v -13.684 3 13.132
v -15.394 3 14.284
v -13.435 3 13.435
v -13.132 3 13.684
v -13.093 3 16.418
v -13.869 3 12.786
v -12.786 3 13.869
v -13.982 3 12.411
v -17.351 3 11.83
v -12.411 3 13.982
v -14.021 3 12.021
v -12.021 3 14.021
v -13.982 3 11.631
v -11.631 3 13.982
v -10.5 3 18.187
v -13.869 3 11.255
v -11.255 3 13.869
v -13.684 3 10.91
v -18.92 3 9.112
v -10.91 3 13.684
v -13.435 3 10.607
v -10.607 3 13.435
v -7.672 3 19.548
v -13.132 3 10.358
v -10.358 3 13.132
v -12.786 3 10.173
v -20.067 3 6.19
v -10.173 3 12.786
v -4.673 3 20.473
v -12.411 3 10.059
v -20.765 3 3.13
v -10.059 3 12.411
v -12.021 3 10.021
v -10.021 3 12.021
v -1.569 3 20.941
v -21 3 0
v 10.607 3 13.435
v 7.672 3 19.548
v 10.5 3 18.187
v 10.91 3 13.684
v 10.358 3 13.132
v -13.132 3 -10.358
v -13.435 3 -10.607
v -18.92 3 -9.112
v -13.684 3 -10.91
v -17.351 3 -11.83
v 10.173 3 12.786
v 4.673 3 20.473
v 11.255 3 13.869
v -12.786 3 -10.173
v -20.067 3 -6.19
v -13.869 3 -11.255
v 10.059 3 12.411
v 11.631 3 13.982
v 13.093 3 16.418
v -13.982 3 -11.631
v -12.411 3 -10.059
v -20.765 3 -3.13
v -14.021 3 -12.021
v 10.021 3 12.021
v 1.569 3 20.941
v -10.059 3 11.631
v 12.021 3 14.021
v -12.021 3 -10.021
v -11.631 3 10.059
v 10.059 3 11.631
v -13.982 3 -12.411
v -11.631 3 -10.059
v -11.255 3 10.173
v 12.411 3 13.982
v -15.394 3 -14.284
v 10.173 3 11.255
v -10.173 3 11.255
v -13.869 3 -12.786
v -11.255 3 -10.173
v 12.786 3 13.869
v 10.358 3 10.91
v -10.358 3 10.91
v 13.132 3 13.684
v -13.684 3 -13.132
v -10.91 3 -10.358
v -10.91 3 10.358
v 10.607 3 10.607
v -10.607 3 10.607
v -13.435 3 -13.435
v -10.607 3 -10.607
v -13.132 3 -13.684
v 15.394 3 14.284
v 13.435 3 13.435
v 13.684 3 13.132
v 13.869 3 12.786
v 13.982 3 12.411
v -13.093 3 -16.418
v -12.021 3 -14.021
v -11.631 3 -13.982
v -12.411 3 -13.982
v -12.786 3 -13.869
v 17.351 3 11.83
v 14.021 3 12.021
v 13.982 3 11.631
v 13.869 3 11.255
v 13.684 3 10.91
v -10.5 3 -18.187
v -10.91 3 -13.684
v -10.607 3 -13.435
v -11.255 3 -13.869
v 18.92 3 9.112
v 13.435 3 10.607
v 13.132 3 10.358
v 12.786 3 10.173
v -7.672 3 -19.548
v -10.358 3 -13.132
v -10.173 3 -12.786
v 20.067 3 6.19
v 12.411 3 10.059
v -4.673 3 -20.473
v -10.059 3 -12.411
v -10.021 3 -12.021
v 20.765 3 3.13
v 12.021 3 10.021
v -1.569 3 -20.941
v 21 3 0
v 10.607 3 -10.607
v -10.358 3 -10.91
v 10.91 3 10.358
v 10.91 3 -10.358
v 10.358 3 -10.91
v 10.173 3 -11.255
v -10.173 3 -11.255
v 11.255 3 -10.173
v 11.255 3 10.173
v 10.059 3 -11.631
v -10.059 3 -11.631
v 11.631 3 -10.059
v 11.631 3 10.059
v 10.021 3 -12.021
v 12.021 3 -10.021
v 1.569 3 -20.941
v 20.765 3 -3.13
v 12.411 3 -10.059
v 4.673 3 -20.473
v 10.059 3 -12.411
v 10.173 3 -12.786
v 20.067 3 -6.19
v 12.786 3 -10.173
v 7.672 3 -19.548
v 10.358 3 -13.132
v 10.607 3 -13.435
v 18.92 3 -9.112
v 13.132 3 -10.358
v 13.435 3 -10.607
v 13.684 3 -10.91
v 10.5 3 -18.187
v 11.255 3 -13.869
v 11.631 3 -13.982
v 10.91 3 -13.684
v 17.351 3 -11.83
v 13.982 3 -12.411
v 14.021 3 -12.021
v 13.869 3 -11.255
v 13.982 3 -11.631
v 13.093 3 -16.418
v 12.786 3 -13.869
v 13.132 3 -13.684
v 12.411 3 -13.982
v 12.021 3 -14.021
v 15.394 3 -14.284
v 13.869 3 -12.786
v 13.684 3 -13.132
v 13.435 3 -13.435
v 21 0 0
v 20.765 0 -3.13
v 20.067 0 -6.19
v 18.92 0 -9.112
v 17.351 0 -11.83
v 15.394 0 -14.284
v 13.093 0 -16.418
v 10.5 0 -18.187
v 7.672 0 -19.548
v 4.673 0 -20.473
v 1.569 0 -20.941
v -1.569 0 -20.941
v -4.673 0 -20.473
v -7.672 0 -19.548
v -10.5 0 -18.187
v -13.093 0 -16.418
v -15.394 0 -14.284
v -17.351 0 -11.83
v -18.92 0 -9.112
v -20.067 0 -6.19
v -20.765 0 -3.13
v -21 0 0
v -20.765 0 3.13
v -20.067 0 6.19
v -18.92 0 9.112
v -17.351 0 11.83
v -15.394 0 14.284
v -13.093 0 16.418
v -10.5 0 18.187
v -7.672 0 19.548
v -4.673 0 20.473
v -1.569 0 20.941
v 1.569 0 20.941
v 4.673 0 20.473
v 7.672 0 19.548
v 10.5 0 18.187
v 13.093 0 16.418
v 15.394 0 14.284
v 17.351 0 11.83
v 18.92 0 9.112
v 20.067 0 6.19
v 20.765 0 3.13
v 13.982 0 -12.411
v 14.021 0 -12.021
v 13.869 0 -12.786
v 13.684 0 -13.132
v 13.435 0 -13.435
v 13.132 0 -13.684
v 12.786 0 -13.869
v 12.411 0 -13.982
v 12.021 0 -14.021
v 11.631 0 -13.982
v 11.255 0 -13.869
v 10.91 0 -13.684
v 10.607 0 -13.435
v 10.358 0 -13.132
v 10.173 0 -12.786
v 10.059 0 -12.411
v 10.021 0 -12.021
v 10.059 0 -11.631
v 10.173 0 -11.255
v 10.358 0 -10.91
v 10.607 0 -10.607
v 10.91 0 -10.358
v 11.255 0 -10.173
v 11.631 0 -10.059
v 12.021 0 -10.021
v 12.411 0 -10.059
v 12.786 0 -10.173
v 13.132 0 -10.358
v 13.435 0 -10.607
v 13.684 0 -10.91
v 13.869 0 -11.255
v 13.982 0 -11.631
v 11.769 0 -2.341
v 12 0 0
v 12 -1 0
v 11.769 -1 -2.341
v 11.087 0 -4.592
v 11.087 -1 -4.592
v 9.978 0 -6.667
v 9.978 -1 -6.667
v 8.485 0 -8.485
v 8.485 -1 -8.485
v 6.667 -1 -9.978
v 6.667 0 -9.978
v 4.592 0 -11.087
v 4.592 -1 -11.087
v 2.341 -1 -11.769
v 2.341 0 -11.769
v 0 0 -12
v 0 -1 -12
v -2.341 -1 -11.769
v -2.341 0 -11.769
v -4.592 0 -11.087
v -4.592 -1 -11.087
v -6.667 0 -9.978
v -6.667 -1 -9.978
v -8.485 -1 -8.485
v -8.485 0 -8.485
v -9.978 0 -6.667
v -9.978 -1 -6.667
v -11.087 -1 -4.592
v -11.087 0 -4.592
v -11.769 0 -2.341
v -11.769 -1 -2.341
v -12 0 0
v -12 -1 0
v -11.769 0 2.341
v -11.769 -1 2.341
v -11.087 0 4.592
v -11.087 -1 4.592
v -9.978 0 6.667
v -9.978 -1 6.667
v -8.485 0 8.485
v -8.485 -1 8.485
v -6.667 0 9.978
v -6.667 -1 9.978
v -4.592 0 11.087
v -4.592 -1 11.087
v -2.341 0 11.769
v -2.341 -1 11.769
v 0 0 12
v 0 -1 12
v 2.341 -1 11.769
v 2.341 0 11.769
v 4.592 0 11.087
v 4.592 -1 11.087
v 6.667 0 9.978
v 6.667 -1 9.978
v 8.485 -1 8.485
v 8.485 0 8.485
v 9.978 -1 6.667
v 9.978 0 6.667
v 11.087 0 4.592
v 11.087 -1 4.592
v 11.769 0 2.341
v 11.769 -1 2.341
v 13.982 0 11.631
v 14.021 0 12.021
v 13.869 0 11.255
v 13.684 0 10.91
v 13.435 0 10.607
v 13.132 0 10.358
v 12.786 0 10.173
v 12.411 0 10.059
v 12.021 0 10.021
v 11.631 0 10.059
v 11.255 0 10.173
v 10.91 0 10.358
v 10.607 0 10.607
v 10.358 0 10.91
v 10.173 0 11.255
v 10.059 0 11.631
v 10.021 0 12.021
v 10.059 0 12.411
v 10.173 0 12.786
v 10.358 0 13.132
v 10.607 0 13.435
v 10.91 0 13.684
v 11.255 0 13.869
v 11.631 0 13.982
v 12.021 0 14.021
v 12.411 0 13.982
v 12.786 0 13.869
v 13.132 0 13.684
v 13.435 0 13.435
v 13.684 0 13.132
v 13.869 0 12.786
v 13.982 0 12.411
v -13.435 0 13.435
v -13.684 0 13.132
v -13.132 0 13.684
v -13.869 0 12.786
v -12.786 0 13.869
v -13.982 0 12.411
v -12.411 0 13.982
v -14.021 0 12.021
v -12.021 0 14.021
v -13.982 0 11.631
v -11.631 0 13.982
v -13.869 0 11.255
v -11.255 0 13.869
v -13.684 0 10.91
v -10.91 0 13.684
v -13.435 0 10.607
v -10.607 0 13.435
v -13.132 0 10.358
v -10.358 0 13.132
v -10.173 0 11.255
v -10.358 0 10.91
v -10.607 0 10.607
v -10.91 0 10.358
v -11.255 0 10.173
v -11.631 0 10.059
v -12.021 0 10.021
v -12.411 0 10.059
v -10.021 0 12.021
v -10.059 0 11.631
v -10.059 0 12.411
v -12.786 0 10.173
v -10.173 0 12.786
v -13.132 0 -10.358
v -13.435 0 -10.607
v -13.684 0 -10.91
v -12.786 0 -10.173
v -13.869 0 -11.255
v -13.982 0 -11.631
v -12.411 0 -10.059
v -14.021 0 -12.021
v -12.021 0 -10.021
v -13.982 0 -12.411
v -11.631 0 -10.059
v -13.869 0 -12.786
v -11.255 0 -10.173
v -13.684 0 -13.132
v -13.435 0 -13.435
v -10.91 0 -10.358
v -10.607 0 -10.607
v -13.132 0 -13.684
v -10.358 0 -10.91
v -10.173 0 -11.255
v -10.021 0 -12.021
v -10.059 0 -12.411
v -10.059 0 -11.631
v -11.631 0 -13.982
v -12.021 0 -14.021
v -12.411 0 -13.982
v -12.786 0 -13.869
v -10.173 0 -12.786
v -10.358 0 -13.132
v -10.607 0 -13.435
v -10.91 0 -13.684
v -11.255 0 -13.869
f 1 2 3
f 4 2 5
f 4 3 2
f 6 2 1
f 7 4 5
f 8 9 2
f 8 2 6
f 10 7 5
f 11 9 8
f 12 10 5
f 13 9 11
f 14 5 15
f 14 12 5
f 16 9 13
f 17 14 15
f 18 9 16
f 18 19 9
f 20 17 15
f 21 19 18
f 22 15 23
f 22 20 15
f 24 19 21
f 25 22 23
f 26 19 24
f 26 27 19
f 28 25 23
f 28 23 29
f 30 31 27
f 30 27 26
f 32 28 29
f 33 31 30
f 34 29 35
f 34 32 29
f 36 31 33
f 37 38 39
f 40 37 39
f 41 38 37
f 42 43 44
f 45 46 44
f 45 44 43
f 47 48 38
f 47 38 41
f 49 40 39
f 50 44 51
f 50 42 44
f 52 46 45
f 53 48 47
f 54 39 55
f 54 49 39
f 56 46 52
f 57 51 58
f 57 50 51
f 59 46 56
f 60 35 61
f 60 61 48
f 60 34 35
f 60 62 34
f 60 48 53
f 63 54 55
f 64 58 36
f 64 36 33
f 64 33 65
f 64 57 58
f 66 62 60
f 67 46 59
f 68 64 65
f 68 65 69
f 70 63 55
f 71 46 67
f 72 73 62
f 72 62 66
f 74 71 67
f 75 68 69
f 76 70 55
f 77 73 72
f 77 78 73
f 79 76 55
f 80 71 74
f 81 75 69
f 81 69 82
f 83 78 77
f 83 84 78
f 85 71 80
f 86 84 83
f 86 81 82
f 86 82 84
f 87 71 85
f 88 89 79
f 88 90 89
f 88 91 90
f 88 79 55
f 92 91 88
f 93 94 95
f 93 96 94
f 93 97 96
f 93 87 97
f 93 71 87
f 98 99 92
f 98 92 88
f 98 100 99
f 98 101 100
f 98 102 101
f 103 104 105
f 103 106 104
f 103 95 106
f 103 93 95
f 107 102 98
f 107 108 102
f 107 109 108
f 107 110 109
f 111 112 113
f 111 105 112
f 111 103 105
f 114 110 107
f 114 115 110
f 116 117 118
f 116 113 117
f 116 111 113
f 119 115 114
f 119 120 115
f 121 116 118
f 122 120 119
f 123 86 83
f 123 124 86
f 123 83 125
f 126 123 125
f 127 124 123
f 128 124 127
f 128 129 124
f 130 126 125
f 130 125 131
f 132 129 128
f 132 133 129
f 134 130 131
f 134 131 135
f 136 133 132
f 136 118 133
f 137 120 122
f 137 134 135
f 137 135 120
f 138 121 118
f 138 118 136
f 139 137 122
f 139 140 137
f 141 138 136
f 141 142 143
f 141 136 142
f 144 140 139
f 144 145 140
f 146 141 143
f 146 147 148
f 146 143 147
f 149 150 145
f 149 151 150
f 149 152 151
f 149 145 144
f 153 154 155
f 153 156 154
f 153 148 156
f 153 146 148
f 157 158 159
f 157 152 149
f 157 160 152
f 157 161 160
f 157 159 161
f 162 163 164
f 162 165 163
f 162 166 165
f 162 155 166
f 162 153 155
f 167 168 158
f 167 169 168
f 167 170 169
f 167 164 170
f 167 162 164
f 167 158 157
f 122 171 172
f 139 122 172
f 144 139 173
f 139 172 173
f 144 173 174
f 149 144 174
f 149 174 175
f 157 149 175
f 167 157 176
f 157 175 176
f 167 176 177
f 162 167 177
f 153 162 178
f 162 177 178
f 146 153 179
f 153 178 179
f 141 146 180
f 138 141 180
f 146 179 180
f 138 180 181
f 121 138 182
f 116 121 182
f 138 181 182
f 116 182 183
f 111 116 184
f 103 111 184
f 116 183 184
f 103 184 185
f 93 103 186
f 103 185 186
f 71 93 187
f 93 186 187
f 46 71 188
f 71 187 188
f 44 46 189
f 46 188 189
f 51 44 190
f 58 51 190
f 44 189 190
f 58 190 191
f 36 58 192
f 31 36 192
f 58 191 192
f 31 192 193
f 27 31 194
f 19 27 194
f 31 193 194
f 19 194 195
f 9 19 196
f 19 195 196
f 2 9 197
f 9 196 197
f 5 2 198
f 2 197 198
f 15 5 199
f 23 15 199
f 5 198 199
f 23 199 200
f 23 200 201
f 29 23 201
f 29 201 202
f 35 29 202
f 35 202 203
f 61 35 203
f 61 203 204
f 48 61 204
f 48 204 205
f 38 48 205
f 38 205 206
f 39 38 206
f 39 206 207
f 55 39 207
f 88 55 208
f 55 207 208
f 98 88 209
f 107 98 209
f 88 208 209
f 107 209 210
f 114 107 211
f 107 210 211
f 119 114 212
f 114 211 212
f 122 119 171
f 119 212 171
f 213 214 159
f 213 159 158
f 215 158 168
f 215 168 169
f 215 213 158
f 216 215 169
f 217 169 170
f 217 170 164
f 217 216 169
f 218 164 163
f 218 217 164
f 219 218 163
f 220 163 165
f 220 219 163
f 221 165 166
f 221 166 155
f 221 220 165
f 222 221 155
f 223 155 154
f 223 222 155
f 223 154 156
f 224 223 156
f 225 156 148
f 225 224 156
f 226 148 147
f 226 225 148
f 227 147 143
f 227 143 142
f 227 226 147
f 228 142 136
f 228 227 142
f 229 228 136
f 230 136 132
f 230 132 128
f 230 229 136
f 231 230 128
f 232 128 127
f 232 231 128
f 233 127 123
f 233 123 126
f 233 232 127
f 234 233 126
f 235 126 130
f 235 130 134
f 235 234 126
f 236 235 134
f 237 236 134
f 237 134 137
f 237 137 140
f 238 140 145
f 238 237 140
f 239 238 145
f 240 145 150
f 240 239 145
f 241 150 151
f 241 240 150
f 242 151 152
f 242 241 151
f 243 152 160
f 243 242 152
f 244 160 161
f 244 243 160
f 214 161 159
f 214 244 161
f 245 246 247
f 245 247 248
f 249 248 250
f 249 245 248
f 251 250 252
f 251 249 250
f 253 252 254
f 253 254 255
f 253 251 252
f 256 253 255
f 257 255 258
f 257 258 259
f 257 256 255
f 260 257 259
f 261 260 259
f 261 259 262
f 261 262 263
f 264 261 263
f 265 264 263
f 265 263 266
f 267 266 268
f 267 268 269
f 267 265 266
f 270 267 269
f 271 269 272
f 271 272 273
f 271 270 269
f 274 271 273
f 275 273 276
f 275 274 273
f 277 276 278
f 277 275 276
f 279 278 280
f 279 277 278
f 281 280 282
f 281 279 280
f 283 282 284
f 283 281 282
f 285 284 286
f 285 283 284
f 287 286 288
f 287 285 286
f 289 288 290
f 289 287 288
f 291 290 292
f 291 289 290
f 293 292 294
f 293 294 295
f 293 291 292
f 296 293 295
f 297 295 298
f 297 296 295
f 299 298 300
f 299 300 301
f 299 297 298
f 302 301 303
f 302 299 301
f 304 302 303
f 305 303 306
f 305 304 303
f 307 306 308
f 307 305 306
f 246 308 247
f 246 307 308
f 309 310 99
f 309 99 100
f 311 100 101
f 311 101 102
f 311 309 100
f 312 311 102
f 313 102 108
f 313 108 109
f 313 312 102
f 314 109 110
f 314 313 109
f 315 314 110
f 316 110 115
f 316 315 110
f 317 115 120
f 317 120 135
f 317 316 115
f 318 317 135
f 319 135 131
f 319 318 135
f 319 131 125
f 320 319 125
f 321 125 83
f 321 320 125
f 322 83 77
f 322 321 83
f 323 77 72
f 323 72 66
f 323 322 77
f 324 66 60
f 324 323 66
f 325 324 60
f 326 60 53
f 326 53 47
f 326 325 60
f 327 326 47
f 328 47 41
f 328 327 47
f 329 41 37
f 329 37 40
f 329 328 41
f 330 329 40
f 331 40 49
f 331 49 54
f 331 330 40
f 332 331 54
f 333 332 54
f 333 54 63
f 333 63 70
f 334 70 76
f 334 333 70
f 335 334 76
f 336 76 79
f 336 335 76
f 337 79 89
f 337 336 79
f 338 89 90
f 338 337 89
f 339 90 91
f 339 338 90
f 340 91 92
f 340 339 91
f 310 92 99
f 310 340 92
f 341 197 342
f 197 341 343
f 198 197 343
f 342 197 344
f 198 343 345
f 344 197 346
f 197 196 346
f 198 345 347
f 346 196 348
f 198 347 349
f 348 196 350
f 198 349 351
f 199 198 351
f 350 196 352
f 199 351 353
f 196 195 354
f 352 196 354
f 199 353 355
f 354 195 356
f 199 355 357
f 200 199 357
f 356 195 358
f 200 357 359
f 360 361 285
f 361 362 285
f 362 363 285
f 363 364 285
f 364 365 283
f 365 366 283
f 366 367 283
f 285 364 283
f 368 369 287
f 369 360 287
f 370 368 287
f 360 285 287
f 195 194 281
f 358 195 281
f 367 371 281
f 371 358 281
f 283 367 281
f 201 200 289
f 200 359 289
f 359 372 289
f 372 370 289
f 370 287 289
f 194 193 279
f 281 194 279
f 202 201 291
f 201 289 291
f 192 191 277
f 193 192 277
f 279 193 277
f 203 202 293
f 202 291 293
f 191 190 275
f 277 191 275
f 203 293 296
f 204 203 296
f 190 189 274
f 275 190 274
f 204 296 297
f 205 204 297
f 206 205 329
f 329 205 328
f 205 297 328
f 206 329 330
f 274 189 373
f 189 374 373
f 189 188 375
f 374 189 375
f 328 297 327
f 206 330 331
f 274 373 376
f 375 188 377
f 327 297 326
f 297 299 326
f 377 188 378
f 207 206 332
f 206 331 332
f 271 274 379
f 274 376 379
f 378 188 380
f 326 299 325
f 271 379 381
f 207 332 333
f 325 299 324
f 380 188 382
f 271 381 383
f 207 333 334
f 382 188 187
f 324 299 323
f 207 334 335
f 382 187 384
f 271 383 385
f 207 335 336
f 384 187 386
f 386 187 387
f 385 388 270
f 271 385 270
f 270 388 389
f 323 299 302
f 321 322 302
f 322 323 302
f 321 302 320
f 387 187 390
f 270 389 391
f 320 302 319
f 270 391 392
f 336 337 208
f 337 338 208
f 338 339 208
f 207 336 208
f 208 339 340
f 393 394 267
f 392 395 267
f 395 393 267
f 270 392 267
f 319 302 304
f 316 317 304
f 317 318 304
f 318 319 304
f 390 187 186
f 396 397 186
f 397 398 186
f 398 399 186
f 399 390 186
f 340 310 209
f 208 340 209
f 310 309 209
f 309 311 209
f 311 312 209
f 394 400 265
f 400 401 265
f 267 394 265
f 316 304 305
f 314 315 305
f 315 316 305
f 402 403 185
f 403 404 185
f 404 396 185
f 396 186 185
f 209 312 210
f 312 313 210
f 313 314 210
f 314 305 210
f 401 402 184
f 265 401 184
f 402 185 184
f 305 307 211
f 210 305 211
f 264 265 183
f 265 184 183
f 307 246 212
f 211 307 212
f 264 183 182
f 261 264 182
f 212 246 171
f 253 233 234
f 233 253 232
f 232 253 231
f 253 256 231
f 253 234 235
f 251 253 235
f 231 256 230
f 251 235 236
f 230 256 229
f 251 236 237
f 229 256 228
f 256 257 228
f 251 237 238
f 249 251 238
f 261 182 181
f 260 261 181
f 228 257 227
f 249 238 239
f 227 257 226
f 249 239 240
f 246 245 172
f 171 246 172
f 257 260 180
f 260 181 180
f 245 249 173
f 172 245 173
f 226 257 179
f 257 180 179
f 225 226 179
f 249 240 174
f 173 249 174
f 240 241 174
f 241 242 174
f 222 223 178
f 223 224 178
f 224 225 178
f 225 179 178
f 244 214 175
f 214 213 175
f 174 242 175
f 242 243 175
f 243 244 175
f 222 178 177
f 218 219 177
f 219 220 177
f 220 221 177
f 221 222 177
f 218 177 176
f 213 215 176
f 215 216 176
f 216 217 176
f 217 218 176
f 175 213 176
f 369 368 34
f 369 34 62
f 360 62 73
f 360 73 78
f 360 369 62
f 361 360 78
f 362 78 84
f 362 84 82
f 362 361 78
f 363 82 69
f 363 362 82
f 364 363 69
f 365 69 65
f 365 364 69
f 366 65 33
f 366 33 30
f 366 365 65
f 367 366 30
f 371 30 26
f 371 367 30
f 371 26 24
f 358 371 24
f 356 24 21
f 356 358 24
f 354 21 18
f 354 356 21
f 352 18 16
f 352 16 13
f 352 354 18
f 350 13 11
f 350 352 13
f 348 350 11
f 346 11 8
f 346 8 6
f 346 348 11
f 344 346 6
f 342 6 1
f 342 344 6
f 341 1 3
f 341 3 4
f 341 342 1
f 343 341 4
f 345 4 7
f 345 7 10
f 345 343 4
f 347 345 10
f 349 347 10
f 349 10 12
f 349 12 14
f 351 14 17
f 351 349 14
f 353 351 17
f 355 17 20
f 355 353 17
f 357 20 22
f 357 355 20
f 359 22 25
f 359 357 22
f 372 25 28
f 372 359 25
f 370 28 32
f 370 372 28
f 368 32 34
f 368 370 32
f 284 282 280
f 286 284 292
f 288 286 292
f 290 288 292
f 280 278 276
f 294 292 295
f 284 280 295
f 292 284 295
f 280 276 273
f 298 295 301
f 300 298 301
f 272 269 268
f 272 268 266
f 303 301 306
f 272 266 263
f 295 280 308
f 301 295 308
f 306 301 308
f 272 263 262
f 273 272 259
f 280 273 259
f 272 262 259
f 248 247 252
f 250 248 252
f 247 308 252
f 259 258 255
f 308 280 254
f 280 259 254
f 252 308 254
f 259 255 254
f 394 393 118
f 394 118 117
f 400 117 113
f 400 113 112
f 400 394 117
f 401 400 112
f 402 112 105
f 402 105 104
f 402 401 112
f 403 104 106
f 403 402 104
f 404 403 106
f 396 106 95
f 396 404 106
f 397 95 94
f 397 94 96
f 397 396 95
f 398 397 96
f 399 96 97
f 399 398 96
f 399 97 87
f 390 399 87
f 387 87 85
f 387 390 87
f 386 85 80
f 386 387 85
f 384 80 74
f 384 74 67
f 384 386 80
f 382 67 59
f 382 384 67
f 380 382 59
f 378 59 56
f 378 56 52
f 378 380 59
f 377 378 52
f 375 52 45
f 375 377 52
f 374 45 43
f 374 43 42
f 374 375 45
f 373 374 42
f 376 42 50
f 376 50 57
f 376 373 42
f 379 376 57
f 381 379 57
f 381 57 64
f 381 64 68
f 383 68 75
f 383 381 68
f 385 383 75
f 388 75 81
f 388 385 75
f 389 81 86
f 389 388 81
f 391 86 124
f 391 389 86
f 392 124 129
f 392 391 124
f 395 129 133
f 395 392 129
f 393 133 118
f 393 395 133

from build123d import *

# Parameters (mm, degrees)
SKETCH1_R                = 21
SKETCH1_R_2              = 12
SKETCH1_R_3              = 2
BOSS_EXTRUDE1_DEPTH      = 3
BOSS_EXTRUDE2_DEPTH      = 3
BOSS_EXTRUDE2_DEPTH_BACK = 1
SKETCH1_2_R              = 12


with BuildPart() as part:
    # Sketch1 → Boss-Extrude1 (new body)
    with BuildSketch(Plane(origin=(0, 0, 0), x_dir=(1, 0, 0), z_dir=(0, 1, 0))):
        Circle(SKETCH1_R)
        Circle(SKETCH1_R_2, mode=Mode.SUBTRACT)
        with Locations((-12.02081528, 12.02081528)):
            Circle(SKETCH1_R_3, mode=Mode.SUBTRACT)
        with Locations((12.02081528, 12.02081528)):
            Circle(SKETCH1_R_3, mode=Mode.SUBTRACT)
        with Locations((12.02081528, -12.02081528)):
            Circle(SKETCH1_R_3, mode=Mode.SUBTRACT)
        with Locations((-12.02081528, -12.02081528)):
            Circle(SKETCH1_R_3, mode=Mode.SUBTRACT)
    extrude(amount=BOSS_EXTRUDE1_DEPTH)

    # Sketch1<2> → Boss-Extrude2 (add, two sides: drawn at the far end of the back side and taken through both)
    with BuildSketch(Plane(origin=(0, 0, 0), x_dir=(1, 0, 0), z_dir=(0, 1, 0)).offset(-BOSS_EXTRUDE2_DEPTH_BACK)):
        Circle(SKETCH1_2_R)
    extrude(amount=BOSS_EXTRUDE2_DEPTH + BOSS_EXTRUDE2_DEPTH_BACK)


solid = part.part
